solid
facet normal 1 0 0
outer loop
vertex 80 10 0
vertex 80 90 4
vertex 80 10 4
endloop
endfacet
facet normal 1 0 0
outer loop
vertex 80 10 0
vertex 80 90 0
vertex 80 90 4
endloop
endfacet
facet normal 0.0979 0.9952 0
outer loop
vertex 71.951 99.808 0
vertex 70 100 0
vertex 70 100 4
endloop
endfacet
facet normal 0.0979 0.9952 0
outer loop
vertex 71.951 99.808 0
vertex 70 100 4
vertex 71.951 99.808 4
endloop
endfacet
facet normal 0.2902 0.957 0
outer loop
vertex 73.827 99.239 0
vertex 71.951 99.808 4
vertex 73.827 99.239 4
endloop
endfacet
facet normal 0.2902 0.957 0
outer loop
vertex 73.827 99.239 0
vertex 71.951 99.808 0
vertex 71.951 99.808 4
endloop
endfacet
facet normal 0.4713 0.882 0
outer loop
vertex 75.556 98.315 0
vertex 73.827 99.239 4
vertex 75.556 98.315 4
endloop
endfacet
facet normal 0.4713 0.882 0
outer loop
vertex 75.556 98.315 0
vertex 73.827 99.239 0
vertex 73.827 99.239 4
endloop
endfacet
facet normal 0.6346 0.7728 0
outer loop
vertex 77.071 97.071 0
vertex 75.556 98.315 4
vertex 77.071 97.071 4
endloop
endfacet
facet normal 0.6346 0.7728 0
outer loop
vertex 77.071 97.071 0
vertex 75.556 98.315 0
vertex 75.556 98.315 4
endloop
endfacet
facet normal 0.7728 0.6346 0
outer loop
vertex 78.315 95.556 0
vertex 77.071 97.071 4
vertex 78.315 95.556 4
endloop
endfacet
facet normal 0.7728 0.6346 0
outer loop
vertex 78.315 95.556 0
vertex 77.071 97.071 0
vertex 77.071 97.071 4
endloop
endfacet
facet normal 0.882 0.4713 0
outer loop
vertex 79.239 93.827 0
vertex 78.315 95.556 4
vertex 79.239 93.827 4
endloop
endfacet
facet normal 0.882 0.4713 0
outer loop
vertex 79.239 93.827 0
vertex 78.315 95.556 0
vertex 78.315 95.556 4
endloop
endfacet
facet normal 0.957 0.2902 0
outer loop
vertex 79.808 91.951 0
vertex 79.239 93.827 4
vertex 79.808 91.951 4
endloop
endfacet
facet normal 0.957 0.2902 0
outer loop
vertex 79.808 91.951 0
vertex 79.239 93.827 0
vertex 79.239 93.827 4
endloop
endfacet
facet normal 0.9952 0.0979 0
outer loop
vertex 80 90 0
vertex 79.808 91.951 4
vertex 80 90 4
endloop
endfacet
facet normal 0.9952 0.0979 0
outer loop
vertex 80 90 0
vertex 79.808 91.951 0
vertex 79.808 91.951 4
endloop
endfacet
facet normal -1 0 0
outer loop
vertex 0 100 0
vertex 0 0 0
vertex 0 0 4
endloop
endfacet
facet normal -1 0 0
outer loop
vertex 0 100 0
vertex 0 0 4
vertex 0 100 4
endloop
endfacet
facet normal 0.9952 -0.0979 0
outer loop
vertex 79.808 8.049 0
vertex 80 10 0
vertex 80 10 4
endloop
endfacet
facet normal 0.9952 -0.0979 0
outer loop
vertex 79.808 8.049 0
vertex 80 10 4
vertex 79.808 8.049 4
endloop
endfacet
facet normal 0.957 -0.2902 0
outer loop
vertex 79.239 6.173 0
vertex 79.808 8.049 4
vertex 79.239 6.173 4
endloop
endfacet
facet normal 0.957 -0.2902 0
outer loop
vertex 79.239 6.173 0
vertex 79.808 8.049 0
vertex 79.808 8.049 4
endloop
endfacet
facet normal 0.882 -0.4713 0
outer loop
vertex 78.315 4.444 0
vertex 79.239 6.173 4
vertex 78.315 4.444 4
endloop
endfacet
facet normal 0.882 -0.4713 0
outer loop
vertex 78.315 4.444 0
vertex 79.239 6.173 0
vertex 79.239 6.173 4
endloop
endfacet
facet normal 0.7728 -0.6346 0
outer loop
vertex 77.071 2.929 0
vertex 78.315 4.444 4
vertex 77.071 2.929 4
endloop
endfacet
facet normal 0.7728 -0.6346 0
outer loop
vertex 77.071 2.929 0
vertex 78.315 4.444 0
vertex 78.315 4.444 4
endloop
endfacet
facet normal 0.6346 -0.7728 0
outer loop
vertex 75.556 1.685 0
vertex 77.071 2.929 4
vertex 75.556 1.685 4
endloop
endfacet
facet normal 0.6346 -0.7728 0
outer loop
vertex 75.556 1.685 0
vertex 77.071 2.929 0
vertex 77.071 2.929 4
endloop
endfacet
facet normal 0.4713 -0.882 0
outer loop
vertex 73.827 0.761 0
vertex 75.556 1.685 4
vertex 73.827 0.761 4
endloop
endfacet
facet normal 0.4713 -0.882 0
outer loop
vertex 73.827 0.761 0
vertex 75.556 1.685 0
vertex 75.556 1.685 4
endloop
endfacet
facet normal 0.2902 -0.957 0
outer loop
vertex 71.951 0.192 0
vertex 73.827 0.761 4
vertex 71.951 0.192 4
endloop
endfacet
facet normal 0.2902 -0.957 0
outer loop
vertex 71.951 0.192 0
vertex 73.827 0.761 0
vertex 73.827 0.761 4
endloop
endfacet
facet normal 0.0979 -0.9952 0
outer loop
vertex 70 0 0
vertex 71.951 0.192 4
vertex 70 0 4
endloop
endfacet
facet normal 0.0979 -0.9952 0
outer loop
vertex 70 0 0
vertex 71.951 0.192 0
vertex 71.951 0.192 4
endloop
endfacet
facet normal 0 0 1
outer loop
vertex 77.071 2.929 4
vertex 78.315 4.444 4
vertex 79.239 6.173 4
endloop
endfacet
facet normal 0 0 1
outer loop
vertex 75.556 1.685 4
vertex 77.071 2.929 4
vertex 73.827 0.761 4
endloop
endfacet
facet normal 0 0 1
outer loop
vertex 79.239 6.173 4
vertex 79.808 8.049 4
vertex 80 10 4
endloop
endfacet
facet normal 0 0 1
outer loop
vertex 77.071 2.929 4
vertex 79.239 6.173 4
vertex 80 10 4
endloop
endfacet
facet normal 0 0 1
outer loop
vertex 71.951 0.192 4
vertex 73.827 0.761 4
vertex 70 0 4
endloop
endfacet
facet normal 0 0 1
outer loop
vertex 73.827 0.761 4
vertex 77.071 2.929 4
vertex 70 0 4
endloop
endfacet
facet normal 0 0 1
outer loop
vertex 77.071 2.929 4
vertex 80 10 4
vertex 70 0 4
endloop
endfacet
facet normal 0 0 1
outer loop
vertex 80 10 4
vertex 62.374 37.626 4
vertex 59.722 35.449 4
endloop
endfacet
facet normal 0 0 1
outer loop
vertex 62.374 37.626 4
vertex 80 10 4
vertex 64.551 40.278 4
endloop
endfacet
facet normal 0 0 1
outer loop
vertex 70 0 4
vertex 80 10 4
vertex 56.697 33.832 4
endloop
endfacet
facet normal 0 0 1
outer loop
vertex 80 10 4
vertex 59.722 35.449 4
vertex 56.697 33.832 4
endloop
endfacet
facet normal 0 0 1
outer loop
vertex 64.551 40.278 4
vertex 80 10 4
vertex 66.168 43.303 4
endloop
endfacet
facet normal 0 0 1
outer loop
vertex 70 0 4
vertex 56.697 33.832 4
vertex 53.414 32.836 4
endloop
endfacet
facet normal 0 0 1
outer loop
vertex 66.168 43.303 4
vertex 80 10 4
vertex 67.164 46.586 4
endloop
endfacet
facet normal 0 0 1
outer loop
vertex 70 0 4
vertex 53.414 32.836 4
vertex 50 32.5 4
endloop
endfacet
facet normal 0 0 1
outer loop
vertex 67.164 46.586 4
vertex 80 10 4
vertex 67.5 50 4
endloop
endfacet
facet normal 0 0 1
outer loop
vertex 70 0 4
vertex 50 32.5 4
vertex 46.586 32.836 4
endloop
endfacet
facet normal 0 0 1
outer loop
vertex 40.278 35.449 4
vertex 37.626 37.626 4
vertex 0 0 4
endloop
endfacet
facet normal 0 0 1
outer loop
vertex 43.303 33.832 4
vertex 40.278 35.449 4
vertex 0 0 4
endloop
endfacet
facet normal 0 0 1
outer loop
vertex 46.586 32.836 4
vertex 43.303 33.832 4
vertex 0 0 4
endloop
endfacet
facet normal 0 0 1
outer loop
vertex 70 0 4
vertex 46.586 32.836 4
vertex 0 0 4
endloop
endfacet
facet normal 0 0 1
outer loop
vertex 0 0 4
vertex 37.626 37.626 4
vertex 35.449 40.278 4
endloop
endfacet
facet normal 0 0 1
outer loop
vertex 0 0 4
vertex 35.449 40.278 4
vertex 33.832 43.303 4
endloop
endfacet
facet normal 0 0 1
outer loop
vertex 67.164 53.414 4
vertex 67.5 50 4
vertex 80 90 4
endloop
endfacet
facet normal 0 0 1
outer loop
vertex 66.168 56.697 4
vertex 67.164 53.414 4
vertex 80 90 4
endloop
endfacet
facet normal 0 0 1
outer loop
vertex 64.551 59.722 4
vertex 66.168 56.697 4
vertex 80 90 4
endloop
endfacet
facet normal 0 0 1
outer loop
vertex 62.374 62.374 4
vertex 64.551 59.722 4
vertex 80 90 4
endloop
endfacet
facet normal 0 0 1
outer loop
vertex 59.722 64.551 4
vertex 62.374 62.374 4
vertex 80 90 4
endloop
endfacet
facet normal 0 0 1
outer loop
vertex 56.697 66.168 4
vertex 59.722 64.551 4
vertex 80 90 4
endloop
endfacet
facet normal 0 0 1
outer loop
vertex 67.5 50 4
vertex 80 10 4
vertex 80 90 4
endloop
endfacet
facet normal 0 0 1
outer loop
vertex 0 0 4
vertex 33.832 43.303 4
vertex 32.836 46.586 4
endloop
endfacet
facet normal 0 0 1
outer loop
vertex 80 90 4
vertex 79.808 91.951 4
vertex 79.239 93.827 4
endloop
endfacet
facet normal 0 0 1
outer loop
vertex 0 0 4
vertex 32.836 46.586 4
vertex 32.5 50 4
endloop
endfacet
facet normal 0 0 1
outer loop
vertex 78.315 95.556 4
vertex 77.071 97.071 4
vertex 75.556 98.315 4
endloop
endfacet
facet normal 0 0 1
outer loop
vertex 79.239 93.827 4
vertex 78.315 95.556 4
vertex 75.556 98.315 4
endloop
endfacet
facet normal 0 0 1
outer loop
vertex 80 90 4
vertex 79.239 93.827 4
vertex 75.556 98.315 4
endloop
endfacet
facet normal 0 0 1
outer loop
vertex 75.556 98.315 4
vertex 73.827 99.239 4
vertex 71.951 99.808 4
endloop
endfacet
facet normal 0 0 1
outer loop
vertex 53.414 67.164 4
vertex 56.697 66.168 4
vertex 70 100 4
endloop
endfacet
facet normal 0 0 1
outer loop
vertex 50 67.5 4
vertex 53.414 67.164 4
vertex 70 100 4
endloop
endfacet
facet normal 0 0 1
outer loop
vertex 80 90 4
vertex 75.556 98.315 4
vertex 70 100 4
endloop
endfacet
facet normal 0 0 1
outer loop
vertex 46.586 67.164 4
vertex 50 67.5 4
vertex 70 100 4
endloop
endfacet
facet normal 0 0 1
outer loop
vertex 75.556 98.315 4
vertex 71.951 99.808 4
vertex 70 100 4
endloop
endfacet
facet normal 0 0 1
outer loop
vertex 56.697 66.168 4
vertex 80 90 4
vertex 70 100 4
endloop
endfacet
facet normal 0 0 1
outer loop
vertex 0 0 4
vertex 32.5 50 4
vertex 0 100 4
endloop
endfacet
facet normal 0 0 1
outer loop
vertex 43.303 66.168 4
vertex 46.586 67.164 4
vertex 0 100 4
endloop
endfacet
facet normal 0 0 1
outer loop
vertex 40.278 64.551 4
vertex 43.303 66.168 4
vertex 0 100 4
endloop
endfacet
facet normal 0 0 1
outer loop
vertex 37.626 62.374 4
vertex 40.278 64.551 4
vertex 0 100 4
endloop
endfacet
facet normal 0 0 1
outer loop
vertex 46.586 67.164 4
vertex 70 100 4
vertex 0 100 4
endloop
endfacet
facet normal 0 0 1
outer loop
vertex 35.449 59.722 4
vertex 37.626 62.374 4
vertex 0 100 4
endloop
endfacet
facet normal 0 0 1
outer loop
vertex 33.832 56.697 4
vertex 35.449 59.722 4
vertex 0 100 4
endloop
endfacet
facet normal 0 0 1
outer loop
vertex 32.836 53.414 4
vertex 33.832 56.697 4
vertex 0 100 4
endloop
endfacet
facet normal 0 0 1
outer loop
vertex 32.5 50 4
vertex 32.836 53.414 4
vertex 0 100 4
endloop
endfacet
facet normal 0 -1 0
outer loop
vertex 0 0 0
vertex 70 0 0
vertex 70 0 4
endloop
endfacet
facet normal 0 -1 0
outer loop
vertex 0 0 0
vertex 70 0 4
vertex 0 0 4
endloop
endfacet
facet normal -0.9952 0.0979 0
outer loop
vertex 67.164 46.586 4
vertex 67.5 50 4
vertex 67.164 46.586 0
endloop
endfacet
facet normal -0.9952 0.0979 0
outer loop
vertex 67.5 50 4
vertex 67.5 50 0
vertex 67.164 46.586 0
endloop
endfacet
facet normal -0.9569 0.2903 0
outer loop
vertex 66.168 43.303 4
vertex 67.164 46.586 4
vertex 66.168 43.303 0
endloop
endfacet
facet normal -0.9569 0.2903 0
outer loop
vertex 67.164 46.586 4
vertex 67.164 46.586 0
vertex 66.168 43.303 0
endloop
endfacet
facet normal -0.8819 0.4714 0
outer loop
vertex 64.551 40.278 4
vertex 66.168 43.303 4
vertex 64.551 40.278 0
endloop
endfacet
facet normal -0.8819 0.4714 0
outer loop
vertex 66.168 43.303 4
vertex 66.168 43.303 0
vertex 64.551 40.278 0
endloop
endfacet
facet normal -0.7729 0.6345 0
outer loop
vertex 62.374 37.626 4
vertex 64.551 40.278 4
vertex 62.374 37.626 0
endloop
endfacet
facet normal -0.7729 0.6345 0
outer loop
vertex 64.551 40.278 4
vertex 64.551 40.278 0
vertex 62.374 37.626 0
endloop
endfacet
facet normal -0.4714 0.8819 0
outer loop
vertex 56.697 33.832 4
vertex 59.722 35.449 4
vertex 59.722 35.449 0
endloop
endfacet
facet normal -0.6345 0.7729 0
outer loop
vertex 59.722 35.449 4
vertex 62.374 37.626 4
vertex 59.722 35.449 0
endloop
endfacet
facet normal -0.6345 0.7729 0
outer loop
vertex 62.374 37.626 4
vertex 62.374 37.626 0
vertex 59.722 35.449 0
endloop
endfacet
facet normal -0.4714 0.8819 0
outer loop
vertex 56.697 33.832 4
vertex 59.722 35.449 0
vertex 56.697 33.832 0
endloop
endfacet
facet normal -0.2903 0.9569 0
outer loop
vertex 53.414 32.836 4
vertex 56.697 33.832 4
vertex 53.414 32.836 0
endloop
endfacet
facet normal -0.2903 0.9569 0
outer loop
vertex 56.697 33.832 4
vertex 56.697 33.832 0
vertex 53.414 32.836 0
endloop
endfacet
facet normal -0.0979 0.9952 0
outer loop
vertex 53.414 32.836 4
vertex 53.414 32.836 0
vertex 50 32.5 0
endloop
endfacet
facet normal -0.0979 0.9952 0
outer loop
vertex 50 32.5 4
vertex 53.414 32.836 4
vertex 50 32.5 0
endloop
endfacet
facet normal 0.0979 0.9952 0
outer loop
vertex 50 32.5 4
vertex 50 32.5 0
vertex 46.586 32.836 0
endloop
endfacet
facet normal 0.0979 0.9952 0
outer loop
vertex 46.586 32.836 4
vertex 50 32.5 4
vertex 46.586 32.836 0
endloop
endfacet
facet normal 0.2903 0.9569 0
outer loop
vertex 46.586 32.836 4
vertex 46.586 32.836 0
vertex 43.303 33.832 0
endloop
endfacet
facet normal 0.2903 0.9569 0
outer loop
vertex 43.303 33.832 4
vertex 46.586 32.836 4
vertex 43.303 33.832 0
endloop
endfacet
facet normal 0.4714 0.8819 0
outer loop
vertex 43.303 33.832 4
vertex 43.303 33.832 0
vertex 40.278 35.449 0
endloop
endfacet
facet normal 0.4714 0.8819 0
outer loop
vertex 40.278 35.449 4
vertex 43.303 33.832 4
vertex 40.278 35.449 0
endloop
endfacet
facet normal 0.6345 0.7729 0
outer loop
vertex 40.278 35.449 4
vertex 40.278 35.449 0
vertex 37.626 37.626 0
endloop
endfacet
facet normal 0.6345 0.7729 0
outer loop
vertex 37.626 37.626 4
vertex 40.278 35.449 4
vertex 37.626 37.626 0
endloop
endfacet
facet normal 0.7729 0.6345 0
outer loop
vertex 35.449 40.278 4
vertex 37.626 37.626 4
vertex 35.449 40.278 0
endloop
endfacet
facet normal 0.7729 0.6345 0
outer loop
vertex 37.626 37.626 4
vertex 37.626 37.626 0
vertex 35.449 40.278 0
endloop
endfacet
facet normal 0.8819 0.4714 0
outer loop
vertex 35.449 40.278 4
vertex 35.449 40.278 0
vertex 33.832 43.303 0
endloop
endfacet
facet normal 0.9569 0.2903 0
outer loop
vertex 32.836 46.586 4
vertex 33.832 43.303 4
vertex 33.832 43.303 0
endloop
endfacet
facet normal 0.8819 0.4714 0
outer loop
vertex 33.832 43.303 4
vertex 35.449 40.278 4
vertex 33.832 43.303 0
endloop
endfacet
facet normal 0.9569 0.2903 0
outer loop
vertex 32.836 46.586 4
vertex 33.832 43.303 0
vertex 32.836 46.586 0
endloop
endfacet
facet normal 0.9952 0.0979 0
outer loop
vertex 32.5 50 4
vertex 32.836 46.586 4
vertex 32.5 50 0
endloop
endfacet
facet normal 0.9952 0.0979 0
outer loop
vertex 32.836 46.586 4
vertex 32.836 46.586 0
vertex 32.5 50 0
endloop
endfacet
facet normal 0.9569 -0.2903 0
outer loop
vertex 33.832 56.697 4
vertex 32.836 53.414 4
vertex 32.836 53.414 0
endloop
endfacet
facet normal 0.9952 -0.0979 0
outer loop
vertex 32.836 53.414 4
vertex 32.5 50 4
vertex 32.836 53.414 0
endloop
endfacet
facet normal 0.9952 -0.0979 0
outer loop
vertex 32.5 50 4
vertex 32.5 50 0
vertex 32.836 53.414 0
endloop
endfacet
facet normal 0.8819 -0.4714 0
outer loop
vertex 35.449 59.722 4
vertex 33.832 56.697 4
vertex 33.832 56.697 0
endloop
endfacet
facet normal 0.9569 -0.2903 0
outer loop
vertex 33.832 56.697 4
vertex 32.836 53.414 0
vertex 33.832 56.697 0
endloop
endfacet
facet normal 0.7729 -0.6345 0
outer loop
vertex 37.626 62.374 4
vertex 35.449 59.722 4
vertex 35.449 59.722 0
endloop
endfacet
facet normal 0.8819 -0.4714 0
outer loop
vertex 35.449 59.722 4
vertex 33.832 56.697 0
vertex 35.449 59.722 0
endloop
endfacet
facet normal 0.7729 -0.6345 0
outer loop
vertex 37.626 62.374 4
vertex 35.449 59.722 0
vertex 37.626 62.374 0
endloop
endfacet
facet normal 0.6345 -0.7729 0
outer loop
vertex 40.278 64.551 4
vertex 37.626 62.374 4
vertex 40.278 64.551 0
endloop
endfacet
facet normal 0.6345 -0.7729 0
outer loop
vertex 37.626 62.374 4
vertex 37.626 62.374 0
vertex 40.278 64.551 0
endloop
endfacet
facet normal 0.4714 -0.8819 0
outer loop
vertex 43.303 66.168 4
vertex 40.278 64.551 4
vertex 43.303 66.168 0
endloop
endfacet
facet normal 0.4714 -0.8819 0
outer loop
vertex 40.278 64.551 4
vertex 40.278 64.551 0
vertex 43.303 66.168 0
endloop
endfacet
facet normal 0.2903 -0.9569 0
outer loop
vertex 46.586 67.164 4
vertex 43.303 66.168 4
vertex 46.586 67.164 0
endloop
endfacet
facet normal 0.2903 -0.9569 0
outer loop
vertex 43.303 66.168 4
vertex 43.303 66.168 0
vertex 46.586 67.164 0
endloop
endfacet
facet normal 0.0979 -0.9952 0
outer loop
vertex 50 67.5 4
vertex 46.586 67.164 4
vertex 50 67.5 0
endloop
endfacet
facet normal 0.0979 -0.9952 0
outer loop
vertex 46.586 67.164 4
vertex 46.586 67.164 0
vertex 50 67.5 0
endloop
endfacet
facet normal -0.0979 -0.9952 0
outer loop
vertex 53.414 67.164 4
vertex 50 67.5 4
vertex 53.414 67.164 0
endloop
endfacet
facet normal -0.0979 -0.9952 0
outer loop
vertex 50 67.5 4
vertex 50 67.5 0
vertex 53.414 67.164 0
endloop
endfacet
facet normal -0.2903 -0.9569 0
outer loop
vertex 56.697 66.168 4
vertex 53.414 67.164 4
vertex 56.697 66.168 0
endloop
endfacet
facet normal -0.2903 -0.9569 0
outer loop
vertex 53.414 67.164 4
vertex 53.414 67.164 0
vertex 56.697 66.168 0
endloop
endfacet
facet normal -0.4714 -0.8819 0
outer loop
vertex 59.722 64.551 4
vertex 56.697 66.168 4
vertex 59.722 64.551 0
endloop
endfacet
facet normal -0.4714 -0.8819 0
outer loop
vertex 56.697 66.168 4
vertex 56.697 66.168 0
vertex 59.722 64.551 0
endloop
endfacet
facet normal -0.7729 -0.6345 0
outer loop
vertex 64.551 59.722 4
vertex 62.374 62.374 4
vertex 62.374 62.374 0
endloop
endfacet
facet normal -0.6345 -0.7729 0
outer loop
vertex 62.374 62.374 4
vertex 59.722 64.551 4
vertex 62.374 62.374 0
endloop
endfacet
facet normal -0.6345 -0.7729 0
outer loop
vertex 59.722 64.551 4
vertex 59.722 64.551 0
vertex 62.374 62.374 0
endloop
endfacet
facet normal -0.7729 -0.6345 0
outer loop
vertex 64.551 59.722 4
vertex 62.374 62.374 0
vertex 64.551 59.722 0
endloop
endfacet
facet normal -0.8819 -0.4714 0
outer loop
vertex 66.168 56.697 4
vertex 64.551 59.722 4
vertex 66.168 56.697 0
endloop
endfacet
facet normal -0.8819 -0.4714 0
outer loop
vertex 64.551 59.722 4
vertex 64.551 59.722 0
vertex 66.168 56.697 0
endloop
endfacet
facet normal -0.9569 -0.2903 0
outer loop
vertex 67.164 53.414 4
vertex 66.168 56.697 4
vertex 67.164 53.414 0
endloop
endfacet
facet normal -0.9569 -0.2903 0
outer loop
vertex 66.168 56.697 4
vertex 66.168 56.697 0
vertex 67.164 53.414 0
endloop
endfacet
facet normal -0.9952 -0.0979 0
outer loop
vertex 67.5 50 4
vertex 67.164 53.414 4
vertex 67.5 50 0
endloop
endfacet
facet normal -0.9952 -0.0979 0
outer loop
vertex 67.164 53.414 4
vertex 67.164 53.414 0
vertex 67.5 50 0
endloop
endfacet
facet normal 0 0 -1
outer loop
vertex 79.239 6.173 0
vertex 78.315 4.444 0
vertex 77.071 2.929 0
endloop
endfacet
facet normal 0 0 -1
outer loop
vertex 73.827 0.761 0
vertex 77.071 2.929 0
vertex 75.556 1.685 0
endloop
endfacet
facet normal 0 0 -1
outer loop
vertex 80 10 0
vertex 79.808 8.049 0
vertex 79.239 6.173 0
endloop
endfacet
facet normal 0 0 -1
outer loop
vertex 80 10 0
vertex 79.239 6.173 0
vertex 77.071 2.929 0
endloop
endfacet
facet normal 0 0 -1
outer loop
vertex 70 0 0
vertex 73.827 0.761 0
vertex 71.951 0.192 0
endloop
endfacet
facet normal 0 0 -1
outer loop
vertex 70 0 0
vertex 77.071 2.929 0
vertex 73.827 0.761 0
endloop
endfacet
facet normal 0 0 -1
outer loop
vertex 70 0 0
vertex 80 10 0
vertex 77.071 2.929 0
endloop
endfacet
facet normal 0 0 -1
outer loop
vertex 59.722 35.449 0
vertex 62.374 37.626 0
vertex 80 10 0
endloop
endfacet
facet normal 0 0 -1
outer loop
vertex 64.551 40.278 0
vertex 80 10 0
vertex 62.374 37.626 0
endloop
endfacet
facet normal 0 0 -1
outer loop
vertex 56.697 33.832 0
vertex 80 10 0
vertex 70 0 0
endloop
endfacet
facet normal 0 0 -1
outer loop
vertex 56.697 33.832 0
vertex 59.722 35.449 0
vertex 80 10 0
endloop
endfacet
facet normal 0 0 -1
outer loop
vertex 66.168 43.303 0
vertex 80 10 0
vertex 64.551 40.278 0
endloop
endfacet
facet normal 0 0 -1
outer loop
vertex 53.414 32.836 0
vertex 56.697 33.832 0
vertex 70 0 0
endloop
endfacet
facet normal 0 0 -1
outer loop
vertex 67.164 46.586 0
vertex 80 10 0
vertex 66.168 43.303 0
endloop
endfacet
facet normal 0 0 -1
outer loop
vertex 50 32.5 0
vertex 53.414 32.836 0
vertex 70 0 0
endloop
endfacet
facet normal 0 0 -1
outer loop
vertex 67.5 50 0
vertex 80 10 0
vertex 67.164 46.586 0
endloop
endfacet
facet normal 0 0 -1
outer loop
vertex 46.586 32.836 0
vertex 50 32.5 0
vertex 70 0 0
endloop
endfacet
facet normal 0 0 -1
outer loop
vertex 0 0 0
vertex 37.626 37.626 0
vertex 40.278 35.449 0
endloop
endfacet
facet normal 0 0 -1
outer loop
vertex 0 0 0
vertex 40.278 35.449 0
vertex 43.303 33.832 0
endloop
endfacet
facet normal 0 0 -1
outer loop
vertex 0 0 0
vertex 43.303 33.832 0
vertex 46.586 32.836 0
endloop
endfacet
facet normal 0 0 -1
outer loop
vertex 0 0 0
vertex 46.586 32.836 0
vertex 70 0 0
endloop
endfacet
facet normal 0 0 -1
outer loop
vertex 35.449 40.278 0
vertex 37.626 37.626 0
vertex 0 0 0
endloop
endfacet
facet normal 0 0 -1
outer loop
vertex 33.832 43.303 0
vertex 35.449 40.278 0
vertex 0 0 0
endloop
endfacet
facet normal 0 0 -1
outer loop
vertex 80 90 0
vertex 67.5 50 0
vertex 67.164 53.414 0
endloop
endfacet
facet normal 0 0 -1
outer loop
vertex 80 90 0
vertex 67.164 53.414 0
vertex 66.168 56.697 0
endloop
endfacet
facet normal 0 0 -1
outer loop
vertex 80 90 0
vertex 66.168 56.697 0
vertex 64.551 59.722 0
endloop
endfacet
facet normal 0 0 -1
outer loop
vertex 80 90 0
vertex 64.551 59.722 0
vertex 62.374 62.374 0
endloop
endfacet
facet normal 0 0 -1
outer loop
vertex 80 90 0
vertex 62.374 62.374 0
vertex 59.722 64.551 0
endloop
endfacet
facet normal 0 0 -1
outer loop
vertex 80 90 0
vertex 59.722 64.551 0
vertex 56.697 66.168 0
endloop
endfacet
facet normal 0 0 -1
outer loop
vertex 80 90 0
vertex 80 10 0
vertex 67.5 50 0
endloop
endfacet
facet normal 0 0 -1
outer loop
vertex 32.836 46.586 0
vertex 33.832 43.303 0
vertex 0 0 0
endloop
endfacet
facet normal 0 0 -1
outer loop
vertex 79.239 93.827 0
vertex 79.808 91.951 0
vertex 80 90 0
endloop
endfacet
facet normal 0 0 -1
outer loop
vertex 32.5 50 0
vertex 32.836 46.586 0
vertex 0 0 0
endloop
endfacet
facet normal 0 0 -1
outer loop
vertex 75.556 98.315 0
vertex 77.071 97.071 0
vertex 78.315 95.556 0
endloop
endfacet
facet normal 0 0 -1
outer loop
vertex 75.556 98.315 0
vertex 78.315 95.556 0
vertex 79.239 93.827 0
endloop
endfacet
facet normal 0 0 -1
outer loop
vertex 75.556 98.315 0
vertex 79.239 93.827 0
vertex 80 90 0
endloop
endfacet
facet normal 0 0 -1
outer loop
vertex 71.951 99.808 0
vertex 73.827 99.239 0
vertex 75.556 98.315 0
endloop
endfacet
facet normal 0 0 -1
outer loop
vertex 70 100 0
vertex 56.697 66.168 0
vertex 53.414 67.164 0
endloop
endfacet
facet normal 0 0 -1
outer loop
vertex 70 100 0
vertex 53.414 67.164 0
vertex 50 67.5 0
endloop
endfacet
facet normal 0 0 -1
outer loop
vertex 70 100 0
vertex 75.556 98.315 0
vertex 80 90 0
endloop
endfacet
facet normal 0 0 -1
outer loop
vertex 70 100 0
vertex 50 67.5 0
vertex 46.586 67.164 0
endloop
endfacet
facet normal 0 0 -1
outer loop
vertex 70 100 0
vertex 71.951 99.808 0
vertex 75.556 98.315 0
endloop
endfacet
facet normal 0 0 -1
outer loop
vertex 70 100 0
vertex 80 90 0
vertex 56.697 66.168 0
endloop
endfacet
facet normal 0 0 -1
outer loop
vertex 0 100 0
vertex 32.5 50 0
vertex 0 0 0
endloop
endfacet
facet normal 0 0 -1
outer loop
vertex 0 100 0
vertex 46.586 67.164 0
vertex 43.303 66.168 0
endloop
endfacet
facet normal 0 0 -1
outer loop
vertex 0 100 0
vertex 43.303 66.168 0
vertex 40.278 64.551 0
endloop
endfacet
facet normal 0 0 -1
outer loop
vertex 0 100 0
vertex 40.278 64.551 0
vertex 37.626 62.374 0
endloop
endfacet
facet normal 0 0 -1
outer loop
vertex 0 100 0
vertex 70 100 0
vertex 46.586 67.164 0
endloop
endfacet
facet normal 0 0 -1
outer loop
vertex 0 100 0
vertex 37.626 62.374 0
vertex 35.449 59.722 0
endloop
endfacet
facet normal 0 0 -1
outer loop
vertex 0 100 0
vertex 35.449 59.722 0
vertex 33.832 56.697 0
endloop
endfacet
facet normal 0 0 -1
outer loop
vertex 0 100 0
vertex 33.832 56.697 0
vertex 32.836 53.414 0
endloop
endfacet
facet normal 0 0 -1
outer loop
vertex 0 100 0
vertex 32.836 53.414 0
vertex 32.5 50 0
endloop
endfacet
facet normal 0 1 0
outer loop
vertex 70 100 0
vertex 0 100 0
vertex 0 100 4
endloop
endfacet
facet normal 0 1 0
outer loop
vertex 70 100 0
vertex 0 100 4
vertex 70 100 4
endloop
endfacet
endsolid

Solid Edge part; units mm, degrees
sketch "Sketch1" plane through (0, 0, 0) normal (0, 0, 1) x (1, 0, 0)
  arc A0 (70, 100) -> (80, 90) centre (70, 90) cw
  line L0 (80, 90) -> (80, 10)
  arc A1 (80, 10) -> (70, 0) centre (70, 10) cw
  line L1 (70, 0) -> (0, 0)
  line L2 (0, 0) -> (0, 100)
  line L3 (0, 100) -> (70, 100)
  circle A2 centre (50, 50) radius 17.5
extrude "Protrusion1" add sketch "Sketch1" along normal blind 4
properties material "Acrílico, alto impacto"
